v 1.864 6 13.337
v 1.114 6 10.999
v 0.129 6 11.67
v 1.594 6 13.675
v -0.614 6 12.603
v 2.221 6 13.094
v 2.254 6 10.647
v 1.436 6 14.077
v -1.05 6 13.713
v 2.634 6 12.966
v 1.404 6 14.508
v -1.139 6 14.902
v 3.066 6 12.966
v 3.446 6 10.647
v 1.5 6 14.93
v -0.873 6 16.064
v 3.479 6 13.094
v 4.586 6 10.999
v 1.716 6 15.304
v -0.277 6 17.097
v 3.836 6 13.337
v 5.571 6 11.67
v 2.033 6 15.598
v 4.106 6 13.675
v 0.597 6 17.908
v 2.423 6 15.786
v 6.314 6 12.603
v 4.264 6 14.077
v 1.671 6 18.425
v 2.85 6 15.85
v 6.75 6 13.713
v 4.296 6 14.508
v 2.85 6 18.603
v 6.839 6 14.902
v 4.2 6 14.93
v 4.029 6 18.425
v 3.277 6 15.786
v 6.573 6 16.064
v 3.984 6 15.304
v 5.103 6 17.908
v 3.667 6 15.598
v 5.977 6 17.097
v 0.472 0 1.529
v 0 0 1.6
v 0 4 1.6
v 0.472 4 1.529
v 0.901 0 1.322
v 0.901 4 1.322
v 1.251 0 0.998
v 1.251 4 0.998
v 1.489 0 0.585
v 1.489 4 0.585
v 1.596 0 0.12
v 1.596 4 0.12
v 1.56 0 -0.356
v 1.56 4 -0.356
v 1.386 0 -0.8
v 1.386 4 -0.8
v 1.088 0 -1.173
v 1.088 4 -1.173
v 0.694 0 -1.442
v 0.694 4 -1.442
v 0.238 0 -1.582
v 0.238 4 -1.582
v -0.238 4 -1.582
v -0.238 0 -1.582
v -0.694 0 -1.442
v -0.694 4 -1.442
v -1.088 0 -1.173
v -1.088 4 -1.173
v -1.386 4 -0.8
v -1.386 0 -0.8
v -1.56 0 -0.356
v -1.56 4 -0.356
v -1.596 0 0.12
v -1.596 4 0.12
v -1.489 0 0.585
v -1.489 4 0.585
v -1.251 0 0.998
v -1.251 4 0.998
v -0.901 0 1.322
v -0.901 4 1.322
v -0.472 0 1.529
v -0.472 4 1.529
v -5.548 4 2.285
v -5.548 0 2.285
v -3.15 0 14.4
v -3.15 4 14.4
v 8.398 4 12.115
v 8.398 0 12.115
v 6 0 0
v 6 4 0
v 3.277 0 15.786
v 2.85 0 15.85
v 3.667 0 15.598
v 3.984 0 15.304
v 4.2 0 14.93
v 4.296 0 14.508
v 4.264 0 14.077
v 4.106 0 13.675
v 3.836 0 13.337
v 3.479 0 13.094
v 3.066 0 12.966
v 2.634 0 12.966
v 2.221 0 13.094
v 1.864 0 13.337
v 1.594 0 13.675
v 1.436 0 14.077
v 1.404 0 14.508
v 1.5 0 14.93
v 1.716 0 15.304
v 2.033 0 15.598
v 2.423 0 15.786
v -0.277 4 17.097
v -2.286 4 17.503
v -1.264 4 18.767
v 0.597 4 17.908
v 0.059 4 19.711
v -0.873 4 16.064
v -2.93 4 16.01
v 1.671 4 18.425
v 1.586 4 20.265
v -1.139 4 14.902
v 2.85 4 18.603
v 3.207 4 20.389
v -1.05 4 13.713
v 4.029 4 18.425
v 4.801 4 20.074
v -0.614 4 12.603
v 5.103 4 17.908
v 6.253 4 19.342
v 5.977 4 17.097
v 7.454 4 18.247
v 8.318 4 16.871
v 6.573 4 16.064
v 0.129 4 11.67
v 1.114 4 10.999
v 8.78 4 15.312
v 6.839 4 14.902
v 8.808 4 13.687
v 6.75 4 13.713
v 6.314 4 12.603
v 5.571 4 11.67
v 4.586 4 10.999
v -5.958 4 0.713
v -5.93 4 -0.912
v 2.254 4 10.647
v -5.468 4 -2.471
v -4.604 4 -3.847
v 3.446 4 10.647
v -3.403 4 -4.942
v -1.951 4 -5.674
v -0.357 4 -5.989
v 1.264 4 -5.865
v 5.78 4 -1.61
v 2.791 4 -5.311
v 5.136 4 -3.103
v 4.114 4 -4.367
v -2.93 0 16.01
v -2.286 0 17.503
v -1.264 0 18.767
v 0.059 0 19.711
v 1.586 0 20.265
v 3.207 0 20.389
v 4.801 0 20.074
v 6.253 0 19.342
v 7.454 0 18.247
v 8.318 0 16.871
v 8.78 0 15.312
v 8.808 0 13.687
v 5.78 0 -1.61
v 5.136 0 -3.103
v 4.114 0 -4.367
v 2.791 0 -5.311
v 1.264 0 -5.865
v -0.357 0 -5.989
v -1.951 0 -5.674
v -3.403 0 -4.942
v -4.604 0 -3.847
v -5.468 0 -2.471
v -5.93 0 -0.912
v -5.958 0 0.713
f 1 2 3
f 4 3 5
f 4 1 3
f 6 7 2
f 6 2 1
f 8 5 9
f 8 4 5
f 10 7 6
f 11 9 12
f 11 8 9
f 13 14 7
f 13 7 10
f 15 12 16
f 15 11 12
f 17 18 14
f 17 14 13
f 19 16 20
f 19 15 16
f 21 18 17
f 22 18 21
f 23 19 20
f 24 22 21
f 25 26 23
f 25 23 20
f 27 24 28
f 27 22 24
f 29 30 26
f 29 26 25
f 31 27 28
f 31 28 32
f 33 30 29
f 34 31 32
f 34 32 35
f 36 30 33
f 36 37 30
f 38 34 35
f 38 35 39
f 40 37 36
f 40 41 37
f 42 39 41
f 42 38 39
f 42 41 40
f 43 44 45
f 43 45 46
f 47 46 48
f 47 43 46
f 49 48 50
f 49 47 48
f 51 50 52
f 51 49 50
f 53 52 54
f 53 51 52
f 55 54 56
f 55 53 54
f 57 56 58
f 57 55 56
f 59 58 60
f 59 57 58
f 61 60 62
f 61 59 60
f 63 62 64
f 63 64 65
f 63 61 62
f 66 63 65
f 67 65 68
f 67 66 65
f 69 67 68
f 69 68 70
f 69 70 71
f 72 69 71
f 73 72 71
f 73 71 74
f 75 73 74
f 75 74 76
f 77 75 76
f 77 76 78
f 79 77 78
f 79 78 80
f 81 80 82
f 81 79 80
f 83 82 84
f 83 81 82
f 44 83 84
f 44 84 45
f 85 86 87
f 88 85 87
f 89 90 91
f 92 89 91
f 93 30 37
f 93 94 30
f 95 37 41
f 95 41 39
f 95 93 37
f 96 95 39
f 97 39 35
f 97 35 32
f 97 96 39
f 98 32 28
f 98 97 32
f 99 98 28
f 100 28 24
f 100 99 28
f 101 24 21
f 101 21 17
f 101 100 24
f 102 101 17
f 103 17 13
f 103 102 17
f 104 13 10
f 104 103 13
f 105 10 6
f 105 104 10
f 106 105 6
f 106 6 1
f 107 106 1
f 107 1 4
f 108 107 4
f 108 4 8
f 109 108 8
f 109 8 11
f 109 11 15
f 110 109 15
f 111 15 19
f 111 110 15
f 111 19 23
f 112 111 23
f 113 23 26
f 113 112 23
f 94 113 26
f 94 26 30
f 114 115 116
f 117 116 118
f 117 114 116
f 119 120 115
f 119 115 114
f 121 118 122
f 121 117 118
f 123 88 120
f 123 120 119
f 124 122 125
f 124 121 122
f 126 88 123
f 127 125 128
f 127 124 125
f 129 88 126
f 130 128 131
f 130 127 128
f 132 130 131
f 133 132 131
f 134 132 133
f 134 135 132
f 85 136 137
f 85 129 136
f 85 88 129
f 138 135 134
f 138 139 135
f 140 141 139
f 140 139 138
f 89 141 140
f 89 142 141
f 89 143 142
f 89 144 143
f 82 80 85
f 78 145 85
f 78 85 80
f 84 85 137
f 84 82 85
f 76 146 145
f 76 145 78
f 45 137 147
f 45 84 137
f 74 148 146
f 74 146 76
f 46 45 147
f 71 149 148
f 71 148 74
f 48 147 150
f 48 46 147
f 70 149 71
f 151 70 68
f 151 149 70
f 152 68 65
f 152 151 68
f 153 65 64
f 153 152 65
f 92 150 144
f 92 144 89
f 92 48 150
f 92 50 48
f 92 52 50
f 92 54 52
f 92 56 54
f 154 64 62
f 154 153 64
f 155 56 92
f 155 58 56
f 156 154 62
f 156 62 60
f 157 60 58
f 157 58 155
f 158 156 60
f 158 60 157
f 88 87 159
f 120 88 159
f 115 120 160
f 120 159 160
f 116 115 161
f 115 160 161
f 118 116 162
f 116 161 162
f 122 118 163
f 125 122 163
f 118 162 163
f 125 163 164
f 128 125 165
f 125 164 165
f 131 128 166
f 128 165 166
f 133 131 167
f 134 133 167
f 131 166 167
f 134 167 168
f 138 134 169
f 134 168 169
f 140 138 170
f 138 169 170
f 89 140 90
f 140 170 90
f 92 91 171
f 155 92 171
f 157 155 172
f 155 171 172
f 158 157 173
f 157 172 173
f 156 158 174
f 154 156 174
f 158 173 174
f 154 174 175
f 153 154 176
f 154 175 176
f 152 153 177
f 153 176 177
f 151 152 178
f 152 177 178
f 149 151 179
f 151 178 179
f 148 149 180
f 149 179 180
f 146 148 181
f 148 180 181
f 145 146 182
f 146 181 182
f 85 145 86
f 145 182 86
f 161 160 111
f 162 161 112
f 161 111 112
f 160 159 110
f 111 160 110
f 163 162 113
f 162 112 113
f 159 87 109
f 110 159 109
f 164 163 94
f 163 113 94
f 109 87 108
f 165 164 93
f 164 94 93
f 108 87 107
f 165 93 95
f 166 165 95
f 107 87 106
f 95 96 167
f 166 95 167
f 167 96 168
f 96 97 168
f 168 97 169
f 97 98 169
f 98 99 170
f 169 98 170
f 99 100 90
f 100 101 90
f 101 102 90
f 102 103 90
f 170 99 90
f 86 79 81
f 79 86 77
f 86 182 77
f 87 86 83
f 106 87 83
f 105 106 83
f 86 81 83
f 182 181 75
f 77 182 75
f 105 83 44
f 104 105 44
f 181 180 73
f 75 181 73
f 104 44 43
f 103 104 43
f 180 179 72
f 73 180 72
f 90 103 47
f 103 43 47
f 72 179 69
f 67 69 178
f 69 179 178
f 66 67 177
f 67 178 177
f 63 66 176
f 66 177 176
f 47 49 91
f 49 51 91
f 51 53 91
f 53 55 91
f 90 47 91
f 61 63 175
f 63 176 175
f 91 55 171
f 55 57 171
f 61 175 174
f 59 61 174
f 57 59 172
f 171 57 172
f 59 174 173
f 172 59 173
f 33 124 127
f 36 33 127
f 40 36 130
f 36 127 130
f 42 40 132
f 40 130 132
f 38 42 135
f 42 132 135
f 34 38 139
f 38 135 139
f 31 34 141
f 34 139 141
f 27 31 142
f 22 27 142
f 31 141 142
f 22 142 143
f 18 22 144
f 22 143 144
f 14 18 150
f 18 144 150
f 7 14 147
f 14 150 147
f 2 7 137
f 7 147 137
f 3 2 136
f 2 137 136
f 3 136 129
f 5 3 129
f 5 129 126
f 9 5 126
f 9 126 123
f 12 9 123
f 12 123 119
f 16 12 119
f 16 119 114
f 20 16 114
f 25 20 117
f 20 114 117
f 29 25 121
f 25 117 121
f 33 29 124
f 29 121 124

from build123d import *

# Parameters (mm, degrees)
SKETCH1_R           = 1.6
SKETCH1_R_2         = 1.45
BOSS_EXTRUDE1_DEPTH = 4
SKETCH2_R           = 4
SKETCH2_R_2         = 1.45
BOSS_EXTRUDE2_DEPTH = 2


with BuildPart() as part:
    # Sketch1 → Boss-Extrude1 (new body)
    with BuildSketch(Plane(origin=(0, 0, 0), x_dir=(1, 0, 0), z_dir=(0, 1, 0))):
        with BuildLine():
            Line((-5.547666284, -2.285475619), (-3.15, -14.4))
            ThreePointArc((-3.15, -14.4), (4.014903922, -20.285830345), (8.397666284, -12.114524381))
            Line((8.397666284, -12.114524381), (6, 0))
            ThreePointArc((6, 0), (-1.164903922, 5.885830345), (-5.547666284, -2.285475619))
        make_face()
        with Locations(Location((0, 0, 0), (0, 0, 270))):
            Circle(SKETCH1_R, mode=Mode.SUBTRACT)
        with Locations(Location((2.85, -14.4, 0), (0, 0, 270))):
            Circle(SKETCH1_R_2, mode=Mode.SUBTRACT)
    extrude(amount=BOSS_EXTRUDE1_DEPTH)

    # Sketch2 → Boss-Extrude2 (add)
    with BuildSketch(Plane(origin=(0, 4, 0), x_dir=(1, 0, 0), z_dir=(0, 1, 0))):
        with Locations(Location((2.85, -14.602637459, 0), (0, 0, 270))):
            Circle(SKETCH2_R)
        with Locations(Location((2.85, -14.4, 0), (0, 0, 270))):
            Circle(SKETCH2_R_2, mode=Mode.SUBTRACT)
    extrude(amount=BOSS_EXTRUDE2_DEPTH)


solid = part.part
